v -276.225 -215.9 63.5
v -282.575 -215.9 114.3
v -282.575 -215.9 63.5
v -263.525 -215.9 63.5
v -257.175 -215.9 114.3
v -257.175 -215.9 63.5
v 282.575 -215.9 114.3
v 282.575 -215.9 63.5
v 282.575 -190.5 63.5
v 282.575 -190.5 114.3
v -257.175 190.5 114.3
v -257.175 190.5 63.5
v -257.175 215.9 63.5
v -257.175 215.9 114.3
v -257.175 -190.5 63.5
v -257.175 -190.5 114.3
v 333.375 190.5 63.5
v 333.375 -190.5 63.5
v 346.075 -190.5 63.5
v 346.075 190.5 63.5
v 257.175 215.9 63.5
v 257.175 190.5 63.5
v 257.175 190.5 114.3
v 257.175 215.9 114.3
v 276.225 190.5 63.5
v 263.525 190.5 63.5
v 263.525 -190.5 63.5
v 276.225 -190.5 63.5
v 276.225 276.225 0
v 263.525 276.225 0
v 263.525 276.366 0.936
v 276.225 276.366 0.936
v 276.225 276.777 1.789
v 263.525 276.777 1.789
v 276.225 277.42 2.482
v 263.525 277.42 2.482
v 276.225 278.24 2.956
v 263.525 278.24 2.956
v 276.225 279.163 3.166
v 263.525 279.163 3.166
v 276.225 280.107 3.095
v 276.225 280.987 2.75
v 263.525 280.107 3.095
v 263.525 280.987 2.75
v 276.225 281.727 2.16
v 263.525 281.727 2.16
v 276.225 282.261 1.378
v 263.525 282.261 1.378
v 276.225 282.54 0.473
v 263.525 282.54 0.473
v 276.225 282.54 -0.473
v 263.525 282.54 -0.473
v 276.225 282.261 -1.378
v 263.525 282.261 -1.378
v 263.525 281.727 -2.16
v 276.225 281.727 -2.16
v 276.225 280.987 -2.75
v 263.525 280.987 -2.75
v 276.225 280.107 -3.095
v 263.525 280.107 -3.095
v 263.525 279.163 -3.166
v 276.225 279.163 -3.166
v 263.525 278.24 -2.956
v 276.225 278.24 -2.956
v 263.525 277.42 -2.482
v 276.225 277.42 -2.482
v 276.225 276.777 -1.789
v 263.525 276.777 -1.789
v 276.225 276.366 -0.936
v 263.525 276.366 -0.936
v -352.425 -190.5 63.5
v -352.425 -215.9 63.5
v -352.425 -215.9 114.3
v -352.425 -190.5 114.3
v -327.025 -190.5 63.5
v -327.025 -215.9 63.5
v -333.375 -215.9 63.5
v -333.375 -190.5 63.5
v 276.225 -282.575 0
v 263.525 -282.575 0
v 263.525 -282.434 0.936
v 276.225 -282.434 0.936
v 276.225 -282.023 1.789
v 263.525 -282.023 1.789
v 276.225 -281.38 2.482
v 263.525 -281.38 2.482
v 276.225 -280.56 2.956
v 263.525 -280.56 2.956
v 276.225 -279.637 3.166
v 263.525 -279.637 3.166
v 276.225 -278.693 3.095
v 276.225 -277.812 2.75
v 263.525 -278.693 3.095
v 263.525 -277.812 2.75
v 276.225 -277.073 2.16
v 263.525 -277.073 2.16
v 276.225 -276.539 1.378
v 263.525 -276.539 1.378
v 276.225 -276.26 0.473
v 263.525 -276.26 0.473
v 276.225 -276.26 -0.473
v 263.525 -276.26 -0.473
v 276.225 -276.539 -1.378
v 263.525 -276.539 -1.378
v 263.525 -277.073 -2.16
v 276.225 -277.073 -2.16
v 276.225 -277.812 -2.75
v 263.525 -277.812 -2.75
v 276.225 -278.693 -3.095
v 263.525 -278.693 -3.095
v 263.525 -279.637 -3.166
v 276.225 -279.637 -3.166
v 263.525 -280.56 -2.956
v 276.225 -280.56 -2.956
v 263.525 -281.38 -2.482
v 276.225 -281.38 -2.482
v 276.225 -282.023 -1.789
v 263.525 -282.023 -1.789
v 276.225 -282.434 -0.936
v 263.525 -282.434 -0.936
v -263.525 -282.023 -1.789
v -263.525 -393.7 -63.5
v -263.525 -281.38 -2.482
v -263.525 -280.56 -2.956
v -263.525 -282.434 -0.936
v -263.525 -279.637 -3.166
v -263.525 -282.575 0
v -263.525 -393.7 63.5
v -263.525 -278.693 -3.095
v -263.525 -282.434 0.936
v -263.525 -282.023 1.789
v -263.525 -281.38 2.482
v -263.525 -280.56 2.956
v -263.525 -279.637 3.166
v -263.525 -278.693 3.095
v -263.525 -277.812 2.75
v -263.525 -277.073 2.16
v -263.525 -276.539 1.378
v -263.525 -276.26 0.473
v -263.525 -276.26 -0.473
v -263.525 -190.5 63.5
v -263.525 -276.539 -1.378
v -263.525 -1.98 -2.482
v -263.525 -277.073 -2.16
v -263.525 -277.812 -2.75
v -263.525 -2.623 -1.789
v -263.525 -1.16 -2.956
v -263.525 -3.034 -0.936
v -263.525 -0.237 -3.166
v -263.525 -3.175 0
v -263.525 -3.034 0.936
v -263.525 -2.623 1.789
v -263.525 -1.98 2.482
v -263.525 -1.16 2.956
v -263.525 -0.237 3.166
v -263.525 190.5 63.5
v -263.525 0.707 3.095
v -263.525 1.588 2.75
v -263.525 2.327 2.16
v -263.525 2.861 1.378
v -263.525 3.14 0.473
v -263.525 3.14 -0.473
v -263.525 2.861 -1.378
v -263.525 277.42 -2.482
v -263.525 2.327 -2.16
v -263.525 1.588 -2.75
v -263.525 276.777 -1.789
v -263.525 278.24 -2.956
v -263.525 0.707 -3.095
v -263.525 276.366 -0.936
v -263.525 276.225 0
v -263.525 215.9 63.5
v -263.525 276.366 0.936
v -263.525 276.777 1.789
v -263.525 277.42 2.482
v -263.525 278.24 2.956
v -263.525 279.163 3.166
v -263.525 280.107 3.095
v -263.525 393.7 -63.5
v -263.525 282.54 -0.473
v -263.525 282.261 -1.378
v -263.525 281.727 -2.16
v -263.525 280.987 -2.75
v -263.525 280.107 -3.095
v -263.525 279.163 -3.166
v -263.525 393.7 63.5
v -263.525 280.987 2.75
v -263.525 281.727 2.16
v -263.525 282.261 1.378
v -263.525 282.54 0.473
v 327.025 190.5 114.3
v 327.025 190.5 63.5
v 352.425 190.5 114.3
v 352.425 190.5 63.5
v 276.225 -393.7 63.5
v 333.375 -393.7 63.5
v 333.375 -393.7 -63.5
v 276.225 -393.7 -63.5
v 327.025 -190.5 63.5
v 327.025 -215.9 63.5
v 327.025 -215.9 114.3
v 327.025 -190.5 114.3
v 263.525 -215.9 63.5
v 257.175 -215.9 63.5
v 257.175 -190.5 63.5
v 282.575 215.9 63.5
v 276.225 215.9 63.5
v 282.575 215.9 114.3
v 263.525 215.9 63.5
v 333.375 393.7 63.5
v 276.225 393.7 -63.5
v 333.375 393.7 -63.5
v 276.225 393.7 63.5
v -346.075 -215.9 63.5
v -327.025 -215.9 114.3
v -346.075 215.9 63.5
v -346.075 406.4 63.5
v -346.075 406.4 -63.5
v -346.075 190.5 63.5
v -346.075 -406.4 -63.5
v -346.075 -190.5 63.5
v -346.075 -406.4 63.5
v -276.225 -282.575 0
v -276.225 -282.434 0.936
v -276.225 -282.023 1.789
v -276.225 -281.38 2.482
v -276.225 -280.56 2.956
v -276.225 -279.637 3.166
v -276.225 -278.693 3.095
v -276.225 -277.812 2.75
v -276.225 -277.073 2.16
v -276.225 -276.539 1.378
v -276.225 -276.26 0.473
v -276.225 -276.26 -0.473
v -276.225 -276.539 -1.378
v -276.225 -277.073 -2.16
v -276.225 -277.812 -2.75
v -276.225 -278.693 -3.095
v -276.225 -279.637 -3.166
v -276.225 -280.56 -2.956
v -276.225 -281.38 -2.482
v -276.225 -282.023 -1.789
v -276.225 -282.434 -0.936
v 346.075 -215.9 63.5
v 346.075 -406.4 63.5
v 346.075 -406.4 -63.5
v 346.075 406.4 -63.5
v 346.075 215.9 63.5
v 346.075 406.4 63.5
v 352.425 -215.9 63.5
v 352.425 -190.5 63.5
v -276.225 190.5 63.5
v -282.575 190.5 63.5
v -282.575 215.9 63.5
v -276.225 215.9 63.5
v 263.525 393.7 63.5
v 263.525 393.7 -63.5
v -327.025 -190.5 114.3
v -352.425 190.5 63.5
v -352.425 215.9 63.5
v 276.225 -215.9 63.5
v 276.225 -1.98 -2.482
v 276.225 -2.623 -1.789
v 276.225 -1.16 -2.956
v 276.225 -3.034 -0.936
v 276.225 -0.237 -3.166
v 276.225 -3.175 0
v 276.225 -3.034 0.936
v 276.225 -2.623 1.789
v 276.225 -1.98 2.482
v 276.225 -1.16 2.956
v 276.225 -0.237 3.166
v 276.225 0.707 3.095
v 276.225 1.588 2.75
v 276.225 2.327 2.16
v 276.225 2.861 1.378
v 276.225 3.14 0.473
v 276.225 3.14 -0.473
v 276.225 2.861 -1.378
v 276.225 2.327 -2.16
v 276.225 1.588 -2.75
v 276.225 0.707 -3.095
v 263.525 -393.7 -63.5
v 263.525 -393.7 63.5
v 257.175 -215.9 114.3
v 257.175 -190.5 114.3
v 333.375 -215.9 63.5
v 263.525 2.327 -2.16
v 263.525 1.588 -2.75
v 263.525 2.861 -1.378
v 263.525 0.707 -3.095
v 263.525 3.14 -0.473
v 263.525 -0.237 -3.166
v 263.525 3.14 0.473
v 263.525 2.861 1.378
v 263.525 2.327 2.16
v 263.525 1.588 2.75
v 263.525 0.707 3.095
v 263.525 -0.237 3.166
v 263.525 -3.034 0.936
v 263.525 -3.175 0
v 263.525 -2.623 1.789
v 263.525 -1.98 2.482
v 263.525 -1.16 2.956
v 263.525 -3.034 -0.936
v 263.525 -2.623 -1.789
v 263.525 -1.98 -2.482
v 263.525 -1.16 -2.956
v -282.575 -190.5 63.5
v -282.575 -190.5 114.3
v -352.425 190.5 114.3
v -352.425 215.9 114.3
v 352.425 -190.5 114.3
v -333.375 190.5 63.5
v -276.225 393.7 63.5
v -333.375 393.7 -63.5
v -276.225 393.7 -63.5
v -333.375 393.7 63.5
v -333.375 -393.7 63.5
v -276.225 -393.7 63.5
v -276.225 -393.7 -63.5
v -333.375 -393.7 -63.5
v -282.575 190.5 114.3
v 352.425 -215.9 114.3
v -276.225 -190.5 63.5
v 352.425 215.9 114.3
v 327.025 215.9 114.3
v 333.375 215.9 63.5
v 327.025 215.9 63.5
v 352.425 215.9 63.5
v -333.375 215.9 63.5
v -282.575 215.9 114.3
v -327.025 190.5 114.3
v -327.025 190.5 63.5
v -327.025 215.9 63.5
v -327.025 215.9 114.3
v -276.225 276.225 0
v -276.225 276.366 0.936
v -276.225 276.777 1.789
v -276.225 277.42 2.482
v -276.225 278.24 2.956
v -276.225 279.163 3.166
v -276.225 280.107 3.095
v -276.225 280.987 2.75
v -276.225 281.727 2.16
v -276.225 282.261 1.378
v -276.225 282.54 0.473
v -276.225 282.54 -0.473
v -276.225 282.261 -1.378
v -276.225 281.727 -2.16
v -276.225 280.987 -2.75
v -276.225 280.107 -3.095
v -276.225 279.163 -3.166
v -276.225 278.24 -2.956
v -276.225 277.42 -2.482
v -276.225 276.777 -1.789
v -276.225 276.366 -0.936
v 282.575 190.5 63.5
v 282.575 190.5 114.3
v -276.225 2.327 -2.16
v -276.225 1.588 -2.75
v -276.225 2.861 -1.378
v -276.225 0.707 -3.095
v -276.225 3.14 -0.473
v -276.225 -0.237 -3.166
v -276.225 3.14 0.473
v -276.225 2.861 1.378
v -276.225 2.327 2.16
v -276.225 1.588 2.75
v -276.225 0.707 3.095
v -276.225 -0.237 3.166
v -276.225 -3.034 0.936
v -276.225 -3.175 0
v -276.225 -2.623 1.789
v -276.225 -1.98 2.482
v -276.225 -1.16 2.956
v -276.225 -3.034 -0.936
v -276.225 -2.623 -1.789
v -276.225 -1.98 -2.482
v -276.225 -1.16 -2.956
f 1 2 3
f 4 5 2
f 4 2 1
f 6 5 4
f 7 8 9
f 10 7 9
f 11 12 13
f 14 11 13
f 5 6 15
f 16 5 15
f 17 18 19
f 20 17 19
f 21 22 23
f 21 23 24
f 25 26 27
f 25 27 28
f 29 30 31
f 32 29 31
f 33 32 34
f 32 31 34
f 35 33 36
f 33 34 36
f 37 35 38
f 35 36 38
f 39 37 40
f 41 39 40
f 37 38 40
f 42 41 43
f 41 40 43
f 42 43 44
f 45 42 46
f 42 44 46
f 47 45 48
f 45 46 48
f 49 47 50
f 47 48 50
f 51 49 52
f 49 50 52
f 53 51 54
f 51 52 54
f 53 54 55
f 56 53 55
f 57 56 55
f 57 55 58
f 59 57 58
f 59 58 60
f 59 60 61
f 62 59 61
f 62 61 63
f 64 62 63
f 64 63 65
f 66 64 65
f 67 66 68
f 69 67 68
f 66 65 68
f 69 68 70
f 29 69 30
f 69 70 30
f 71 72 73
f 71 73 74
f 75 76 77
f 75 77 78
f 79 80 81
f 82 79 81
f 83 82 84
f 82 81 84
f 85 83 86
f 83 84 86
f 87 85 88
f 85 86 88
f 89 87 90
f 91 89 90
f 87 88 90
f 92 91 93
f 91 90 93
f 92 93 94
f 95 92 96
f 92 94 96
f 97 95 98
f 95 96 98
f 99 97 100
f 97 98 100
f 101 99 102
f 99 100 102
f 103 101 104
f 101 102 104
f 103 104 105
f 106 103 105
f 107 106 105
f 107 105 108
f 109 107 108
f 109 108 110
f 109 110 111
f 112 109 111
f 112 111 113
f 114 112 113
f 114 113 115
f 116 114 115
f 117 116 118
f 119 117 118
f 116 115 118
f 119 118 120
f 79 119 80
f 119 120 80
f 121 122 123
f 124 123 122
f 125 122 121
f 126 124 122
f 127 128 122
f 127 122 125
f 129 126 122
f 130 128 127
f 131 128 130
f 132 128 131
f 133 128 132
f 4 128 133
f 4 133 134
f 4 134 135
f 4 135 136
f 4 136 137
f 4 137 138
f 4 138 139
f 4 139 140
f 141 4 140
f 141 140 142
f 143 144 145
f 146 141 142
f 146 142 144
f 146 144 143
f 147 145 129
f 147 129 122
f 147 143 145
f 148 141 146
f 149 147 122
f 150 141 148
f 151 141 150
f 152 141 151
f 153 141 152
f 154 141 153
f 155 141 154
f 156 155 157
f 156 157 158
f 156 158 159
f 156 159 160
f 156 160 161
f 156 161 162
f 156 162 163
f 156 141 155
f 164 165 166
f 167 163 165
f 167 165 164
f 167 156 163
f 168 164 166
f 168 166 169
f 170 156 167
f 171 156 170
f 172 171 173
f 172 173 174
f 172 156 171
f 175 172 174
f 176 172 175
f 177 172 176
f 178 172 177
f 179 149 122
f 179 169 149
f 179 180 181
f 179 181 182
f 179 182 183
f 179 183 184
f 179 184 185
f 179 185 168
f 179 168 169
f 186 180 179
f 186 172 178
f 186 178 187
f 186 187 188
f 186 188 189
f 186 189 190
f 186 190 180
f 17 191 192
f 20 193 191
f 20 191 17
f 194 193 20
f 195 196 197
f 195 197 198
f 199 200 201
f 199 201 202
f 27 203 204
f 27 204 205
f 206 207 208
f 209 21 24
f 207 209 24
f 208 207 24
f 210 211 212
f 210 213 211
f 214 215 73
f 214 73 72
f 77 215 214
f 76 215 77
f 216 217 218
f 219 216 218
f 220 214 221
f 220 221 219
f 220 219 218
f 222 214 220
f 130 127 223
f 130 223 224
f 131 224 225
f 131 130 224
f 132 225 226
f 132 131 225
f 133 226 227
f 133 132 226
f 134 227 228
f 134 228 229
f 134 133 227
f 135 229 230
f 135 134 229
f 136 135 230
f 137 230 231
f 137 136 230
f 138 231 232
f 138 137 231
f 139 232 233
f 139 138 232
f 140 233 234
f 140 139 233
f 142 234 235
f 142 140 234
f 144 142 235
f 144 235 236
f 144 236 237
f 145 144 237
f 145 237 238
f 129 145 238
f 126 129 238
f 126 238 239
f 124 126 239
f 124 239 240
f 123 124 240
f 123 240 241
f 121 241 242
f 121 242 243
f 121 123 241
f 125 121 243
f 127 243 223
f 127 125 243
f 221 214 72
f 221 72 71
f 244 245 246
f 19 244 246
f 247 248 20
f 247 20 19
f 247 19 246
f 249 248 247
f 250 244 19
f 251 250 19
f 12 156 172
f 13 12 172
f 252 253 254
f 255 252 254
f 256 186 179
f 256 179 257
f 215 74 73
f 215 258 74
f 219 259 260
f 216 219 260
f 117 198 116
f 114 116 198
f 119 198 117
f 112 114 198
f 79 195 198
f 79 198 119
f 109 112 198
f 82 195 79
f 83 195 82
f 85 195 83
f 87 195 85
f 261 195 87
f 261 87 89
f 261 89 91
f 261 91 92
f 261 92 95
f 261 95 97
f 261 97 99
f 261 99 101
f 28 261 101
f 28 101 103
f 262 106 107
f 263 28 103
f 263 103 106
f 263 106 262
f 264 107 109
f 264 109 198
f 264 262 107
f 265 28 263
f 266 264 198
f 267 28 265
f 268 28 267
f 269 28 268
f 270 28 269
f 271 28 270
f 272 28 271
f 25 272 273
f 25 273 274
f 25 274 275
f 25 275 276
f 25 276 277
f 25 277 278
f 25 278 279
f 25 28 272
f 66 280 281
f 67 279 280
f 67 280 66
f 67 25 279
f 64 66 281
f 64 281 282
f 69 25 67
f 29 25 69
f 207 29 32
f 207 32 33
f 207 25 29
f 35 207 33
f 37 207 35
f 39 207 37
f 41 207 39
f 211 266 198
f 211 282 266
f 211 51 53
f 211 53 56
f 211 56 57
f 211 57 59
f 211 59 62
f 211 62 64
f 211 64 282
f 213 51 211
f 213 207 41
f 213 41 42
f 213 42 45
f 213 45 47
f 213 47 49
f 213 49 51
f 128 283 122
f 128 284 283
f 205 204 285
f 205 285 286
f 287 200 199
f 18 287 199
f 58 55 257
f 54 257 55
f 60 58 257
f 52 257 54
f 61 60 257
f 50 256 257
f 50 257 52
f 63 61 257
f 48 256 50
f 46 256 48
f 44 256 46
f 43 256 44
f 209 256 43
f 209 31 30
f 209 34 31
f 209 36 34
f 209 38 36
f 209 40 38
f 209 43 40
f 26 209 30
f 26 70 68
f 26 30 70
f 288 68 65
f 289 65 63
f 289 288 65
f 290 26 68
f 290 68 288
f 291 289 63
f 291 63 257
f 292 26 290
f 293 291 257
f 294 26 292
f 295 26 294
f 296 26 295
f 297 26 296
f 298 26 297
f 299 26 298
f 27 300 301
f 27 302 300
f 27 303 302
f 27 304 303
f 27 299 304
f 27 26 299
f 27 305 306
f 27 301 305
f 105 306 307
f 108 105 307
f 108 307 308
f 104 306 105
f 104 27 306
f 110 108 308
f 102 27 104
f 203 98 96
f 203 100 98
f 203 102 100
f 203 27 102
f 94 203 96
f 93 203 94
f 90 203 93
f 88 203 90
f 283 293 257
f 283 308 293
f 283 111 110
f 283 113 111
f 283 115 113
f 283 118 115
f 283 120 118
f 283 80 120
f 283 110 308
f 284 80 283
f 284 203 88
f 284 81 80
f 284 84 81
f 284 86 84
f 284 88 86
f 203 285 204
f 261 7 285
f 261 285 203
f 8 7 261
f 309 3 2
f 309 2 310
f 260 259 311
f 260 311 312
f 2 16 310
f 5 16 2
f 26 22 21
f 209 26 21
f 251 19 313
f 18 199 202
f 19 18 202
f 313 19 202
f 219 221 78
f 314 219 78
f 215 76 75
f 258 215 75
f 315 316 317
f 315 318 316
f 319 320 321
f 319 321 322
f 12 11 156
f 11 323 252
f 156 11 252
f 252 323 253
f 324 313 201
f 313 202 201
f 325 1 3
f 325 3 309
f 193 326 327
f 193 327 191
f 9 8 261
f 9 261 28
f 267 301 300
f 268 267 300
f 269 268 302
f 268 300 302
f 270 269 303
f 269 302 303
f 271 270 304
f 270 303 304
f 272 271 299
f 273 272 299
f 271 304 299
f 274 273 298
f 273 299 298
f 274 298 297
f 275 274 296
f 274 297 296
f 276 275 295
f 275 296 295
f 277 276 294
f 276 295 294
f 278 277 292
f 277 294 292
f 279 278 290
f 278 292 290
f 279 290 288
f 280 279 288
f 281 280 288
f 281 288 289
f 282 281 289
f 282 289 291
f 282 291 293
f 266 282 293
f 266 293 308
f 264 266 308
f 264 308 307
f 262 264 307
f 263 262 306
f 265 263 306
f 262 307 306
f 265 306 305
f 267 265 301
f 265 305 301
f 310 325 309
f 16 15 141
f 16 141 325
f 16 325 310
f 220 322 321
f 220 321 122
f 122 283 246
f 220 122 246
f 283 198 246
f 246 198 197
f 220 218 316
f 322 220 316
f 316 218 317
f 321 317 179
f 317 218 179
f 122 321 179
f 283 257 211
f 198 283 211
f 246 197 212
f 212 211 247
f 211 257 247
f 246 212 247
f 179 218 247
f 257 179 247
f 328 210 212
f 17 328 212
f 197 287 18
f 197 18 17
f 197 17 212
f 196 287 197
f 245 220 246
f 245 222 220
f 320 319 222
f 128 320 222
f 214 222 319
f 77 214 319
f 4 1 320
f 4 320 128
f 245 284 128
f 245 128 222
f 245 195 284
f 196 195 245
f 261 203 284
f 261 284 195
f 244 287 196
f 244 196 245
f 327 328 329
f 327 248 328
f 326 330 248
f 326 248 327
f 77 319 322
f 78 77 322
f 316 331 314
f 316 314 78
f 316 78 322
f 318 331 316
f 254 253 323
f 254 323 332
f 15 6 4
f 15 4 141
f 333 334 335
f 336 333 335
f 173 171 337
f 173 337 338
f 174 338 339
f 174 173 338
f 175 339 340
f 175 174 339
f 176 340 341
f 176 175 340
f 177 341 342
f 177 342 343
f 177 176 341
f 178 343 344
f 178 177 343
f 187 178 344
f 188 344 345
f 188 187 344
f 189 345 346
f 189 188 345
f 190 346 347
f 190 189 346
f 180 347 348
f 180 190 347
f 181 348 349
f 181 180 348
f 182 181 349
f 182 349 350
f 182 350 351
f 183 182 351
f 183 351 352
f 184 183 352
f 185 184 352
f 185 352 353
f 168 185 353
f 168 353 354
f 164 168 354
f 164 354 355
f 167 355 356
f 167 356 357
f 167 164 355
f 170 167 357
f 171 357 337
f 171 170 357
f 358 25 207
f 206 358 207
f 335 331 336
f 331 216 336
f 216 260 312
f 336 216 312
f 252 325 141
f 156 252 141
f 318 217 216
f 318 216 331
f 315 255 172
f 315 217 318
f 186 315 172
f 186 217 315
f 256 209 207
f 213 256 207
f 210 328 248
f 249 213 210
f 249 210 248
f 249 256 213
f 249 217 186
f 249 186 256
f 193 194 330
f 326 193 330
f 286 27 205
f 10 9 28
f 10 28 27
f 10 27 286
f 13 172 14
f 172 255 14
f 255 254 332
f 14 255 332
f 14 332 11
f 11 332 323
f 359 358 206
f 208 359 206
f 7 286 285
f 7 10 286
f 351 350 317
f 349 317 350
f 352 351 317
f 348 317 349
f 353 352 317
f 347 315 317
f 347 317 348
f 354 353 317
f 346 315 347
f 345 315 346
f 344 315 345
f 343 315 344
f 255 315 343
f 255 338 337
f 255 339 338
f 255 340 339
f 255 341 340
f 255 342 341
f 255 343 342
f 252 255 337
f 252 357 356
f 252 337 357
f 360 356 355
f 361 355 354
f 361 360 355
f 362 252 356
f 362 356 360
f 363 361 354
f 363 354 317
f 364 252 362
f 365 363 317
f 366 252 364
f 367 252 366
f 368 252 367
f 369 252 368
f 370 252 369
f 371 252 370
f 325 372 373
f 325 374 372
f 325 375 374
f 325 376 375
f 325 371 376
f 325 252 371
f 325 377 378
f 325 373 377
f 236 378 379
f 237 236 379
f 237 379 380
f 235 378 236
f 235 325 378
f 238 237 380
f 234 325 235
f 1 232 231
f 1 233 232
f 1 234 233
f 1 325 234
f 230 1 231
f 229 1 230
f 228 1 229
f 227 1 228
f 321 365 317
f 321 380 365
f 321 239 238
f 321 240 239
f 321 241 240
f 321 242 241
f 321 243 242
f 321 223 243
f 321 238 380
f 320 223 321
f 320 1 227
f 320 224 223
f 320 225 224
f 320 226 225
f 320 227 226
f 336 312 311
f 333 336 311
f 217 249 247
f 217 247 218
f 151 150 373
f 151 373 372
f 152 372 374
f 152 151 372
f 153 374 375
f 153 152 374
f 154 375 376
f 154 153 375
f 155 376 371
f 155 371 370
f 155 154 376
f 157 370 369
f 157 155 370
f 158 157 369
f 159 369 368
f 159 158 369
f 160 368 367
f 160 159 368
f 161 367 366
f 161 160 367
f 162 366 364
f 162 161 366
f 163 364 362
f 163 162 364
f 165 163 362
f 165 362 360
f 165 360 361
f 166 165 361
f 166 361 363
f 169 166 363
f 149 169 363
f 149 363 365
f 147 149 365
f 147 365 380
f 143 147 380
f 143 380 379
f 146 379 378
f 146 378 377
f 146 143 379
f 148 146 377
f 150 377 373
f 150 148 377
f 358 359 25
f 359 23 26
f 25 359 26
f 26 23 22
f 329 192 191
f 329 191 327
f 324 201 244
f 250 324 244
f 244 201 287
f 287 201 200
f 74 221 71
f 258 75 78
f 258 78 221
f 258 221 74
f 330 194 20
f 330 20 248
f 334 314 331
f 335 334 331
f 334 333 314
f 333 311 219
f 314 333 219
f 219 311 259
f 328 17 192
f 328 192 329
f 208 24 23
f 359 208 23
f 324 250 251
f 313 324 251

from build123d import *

# Parameters (mm, degrees)
F1_DEPTH = 63.5
F2_R     = 3.175
F3_DEPTH = 12.7
F6_DEPTH = 12.7


# Not quite as in the source:
# - a pattern or mirror of a feature is missing from the dataset's text; its kind, count and spacing are read off the source's solid


with BuildPart() as f1:
    # F0 (on Top) → F1 (new body, symmetric)
    with BuildSketch(Plane.XY):
        Polygon((-346.075, -406.4), (346.075, -406.4), (346.075, -393.7), (346.075, 406.4), (-290.28644, 406.4), (-294.2266940207, 406.4), (-346.075, 406.4), (-346.075, 393.7), align=None)
        Polygon((-276.225, 393.7), (-276.225, 383.1179738045), (-276.225, -393.7), (-333.375, -393.7), (-333.375, 393.7), align=None, mode=Mode.SUBTRACT)
        Polygon((-263.525, -393.7), (-263.525, 383.1179738045), (-263.525, 393.7), (263.525, 393.7), (263.525, 383.1179738045), (263.525, -393.7), align=None, mode=Mode.SUBTRACT)
        Polygon((333.375, 393.7), (333.375, -393.7), (276.225, -393.7), (276.225, 383.1179738045), (276.225, 393.7), align=None, mode=Mode.SUBTRACT)
    extrude(amount=F1_DEPTH, both=True)

    # F2 (on face) → F3 (cut)
    with BuildSketch(Plane(origin=(263.525, 0, 0), x_dir=(0, -1, 0), z_dir=(-1, 0, 0))):
        Circle(F2_R)
        with Locations((-279.4, 0)):
            Circle(F2_R)
        with Locations((279.4, 0)):
            Circle(F2_R)
    f3 = extrude(amount=-F3_DEPTH, mode=Mode.SUBTRACT)

    # F3_copies: F3 across plane
    add(f3.mirror(Plane(origin=(0, 0, 0), x_dir=(0, 0, -1), z_dir=(-1, 0, 0))), mode=Mode.SUBTRACT)

    # F5 (on mid) → F6 (join, symmetric)
    with BuildSketch(Plane.YZ.offset(339.725)):
        Polygon((-215.9, 63.5), (-203.2, 63.5), (-190.5, 63.5), (-190.5, 114.3), (-215.9, 114.3), align=None)
        Polygon((190.5, 63.5), (203.2, 63.5), (215.9, 63.5), (215.9, 114.3), (190.5, 114.3), align=None)
    f6 = extrude(amount=F6_DEPTH, both=True)

    # F6_copies: F6 across plane
    add(f6.mirror(Plane(origin=(0, 0, 0), x_dir=(0, 0, -1), z_dir=(-1, 0, 0))))

    # F6_copies1: F6 across plane
    add(f6.mirror(Plane(origin=(304.8, 0, 0), x_dir=(0, 0, -1), z_dir=(-1, 0, 0))))

    # F6_copies2: F6 across plane
    add(f6.mirror(Plane(origin=(34.925, 0, 0), x_dir=(0, 0, -1), z_dir=(-1, 0, 0))))


solid = f1.part
